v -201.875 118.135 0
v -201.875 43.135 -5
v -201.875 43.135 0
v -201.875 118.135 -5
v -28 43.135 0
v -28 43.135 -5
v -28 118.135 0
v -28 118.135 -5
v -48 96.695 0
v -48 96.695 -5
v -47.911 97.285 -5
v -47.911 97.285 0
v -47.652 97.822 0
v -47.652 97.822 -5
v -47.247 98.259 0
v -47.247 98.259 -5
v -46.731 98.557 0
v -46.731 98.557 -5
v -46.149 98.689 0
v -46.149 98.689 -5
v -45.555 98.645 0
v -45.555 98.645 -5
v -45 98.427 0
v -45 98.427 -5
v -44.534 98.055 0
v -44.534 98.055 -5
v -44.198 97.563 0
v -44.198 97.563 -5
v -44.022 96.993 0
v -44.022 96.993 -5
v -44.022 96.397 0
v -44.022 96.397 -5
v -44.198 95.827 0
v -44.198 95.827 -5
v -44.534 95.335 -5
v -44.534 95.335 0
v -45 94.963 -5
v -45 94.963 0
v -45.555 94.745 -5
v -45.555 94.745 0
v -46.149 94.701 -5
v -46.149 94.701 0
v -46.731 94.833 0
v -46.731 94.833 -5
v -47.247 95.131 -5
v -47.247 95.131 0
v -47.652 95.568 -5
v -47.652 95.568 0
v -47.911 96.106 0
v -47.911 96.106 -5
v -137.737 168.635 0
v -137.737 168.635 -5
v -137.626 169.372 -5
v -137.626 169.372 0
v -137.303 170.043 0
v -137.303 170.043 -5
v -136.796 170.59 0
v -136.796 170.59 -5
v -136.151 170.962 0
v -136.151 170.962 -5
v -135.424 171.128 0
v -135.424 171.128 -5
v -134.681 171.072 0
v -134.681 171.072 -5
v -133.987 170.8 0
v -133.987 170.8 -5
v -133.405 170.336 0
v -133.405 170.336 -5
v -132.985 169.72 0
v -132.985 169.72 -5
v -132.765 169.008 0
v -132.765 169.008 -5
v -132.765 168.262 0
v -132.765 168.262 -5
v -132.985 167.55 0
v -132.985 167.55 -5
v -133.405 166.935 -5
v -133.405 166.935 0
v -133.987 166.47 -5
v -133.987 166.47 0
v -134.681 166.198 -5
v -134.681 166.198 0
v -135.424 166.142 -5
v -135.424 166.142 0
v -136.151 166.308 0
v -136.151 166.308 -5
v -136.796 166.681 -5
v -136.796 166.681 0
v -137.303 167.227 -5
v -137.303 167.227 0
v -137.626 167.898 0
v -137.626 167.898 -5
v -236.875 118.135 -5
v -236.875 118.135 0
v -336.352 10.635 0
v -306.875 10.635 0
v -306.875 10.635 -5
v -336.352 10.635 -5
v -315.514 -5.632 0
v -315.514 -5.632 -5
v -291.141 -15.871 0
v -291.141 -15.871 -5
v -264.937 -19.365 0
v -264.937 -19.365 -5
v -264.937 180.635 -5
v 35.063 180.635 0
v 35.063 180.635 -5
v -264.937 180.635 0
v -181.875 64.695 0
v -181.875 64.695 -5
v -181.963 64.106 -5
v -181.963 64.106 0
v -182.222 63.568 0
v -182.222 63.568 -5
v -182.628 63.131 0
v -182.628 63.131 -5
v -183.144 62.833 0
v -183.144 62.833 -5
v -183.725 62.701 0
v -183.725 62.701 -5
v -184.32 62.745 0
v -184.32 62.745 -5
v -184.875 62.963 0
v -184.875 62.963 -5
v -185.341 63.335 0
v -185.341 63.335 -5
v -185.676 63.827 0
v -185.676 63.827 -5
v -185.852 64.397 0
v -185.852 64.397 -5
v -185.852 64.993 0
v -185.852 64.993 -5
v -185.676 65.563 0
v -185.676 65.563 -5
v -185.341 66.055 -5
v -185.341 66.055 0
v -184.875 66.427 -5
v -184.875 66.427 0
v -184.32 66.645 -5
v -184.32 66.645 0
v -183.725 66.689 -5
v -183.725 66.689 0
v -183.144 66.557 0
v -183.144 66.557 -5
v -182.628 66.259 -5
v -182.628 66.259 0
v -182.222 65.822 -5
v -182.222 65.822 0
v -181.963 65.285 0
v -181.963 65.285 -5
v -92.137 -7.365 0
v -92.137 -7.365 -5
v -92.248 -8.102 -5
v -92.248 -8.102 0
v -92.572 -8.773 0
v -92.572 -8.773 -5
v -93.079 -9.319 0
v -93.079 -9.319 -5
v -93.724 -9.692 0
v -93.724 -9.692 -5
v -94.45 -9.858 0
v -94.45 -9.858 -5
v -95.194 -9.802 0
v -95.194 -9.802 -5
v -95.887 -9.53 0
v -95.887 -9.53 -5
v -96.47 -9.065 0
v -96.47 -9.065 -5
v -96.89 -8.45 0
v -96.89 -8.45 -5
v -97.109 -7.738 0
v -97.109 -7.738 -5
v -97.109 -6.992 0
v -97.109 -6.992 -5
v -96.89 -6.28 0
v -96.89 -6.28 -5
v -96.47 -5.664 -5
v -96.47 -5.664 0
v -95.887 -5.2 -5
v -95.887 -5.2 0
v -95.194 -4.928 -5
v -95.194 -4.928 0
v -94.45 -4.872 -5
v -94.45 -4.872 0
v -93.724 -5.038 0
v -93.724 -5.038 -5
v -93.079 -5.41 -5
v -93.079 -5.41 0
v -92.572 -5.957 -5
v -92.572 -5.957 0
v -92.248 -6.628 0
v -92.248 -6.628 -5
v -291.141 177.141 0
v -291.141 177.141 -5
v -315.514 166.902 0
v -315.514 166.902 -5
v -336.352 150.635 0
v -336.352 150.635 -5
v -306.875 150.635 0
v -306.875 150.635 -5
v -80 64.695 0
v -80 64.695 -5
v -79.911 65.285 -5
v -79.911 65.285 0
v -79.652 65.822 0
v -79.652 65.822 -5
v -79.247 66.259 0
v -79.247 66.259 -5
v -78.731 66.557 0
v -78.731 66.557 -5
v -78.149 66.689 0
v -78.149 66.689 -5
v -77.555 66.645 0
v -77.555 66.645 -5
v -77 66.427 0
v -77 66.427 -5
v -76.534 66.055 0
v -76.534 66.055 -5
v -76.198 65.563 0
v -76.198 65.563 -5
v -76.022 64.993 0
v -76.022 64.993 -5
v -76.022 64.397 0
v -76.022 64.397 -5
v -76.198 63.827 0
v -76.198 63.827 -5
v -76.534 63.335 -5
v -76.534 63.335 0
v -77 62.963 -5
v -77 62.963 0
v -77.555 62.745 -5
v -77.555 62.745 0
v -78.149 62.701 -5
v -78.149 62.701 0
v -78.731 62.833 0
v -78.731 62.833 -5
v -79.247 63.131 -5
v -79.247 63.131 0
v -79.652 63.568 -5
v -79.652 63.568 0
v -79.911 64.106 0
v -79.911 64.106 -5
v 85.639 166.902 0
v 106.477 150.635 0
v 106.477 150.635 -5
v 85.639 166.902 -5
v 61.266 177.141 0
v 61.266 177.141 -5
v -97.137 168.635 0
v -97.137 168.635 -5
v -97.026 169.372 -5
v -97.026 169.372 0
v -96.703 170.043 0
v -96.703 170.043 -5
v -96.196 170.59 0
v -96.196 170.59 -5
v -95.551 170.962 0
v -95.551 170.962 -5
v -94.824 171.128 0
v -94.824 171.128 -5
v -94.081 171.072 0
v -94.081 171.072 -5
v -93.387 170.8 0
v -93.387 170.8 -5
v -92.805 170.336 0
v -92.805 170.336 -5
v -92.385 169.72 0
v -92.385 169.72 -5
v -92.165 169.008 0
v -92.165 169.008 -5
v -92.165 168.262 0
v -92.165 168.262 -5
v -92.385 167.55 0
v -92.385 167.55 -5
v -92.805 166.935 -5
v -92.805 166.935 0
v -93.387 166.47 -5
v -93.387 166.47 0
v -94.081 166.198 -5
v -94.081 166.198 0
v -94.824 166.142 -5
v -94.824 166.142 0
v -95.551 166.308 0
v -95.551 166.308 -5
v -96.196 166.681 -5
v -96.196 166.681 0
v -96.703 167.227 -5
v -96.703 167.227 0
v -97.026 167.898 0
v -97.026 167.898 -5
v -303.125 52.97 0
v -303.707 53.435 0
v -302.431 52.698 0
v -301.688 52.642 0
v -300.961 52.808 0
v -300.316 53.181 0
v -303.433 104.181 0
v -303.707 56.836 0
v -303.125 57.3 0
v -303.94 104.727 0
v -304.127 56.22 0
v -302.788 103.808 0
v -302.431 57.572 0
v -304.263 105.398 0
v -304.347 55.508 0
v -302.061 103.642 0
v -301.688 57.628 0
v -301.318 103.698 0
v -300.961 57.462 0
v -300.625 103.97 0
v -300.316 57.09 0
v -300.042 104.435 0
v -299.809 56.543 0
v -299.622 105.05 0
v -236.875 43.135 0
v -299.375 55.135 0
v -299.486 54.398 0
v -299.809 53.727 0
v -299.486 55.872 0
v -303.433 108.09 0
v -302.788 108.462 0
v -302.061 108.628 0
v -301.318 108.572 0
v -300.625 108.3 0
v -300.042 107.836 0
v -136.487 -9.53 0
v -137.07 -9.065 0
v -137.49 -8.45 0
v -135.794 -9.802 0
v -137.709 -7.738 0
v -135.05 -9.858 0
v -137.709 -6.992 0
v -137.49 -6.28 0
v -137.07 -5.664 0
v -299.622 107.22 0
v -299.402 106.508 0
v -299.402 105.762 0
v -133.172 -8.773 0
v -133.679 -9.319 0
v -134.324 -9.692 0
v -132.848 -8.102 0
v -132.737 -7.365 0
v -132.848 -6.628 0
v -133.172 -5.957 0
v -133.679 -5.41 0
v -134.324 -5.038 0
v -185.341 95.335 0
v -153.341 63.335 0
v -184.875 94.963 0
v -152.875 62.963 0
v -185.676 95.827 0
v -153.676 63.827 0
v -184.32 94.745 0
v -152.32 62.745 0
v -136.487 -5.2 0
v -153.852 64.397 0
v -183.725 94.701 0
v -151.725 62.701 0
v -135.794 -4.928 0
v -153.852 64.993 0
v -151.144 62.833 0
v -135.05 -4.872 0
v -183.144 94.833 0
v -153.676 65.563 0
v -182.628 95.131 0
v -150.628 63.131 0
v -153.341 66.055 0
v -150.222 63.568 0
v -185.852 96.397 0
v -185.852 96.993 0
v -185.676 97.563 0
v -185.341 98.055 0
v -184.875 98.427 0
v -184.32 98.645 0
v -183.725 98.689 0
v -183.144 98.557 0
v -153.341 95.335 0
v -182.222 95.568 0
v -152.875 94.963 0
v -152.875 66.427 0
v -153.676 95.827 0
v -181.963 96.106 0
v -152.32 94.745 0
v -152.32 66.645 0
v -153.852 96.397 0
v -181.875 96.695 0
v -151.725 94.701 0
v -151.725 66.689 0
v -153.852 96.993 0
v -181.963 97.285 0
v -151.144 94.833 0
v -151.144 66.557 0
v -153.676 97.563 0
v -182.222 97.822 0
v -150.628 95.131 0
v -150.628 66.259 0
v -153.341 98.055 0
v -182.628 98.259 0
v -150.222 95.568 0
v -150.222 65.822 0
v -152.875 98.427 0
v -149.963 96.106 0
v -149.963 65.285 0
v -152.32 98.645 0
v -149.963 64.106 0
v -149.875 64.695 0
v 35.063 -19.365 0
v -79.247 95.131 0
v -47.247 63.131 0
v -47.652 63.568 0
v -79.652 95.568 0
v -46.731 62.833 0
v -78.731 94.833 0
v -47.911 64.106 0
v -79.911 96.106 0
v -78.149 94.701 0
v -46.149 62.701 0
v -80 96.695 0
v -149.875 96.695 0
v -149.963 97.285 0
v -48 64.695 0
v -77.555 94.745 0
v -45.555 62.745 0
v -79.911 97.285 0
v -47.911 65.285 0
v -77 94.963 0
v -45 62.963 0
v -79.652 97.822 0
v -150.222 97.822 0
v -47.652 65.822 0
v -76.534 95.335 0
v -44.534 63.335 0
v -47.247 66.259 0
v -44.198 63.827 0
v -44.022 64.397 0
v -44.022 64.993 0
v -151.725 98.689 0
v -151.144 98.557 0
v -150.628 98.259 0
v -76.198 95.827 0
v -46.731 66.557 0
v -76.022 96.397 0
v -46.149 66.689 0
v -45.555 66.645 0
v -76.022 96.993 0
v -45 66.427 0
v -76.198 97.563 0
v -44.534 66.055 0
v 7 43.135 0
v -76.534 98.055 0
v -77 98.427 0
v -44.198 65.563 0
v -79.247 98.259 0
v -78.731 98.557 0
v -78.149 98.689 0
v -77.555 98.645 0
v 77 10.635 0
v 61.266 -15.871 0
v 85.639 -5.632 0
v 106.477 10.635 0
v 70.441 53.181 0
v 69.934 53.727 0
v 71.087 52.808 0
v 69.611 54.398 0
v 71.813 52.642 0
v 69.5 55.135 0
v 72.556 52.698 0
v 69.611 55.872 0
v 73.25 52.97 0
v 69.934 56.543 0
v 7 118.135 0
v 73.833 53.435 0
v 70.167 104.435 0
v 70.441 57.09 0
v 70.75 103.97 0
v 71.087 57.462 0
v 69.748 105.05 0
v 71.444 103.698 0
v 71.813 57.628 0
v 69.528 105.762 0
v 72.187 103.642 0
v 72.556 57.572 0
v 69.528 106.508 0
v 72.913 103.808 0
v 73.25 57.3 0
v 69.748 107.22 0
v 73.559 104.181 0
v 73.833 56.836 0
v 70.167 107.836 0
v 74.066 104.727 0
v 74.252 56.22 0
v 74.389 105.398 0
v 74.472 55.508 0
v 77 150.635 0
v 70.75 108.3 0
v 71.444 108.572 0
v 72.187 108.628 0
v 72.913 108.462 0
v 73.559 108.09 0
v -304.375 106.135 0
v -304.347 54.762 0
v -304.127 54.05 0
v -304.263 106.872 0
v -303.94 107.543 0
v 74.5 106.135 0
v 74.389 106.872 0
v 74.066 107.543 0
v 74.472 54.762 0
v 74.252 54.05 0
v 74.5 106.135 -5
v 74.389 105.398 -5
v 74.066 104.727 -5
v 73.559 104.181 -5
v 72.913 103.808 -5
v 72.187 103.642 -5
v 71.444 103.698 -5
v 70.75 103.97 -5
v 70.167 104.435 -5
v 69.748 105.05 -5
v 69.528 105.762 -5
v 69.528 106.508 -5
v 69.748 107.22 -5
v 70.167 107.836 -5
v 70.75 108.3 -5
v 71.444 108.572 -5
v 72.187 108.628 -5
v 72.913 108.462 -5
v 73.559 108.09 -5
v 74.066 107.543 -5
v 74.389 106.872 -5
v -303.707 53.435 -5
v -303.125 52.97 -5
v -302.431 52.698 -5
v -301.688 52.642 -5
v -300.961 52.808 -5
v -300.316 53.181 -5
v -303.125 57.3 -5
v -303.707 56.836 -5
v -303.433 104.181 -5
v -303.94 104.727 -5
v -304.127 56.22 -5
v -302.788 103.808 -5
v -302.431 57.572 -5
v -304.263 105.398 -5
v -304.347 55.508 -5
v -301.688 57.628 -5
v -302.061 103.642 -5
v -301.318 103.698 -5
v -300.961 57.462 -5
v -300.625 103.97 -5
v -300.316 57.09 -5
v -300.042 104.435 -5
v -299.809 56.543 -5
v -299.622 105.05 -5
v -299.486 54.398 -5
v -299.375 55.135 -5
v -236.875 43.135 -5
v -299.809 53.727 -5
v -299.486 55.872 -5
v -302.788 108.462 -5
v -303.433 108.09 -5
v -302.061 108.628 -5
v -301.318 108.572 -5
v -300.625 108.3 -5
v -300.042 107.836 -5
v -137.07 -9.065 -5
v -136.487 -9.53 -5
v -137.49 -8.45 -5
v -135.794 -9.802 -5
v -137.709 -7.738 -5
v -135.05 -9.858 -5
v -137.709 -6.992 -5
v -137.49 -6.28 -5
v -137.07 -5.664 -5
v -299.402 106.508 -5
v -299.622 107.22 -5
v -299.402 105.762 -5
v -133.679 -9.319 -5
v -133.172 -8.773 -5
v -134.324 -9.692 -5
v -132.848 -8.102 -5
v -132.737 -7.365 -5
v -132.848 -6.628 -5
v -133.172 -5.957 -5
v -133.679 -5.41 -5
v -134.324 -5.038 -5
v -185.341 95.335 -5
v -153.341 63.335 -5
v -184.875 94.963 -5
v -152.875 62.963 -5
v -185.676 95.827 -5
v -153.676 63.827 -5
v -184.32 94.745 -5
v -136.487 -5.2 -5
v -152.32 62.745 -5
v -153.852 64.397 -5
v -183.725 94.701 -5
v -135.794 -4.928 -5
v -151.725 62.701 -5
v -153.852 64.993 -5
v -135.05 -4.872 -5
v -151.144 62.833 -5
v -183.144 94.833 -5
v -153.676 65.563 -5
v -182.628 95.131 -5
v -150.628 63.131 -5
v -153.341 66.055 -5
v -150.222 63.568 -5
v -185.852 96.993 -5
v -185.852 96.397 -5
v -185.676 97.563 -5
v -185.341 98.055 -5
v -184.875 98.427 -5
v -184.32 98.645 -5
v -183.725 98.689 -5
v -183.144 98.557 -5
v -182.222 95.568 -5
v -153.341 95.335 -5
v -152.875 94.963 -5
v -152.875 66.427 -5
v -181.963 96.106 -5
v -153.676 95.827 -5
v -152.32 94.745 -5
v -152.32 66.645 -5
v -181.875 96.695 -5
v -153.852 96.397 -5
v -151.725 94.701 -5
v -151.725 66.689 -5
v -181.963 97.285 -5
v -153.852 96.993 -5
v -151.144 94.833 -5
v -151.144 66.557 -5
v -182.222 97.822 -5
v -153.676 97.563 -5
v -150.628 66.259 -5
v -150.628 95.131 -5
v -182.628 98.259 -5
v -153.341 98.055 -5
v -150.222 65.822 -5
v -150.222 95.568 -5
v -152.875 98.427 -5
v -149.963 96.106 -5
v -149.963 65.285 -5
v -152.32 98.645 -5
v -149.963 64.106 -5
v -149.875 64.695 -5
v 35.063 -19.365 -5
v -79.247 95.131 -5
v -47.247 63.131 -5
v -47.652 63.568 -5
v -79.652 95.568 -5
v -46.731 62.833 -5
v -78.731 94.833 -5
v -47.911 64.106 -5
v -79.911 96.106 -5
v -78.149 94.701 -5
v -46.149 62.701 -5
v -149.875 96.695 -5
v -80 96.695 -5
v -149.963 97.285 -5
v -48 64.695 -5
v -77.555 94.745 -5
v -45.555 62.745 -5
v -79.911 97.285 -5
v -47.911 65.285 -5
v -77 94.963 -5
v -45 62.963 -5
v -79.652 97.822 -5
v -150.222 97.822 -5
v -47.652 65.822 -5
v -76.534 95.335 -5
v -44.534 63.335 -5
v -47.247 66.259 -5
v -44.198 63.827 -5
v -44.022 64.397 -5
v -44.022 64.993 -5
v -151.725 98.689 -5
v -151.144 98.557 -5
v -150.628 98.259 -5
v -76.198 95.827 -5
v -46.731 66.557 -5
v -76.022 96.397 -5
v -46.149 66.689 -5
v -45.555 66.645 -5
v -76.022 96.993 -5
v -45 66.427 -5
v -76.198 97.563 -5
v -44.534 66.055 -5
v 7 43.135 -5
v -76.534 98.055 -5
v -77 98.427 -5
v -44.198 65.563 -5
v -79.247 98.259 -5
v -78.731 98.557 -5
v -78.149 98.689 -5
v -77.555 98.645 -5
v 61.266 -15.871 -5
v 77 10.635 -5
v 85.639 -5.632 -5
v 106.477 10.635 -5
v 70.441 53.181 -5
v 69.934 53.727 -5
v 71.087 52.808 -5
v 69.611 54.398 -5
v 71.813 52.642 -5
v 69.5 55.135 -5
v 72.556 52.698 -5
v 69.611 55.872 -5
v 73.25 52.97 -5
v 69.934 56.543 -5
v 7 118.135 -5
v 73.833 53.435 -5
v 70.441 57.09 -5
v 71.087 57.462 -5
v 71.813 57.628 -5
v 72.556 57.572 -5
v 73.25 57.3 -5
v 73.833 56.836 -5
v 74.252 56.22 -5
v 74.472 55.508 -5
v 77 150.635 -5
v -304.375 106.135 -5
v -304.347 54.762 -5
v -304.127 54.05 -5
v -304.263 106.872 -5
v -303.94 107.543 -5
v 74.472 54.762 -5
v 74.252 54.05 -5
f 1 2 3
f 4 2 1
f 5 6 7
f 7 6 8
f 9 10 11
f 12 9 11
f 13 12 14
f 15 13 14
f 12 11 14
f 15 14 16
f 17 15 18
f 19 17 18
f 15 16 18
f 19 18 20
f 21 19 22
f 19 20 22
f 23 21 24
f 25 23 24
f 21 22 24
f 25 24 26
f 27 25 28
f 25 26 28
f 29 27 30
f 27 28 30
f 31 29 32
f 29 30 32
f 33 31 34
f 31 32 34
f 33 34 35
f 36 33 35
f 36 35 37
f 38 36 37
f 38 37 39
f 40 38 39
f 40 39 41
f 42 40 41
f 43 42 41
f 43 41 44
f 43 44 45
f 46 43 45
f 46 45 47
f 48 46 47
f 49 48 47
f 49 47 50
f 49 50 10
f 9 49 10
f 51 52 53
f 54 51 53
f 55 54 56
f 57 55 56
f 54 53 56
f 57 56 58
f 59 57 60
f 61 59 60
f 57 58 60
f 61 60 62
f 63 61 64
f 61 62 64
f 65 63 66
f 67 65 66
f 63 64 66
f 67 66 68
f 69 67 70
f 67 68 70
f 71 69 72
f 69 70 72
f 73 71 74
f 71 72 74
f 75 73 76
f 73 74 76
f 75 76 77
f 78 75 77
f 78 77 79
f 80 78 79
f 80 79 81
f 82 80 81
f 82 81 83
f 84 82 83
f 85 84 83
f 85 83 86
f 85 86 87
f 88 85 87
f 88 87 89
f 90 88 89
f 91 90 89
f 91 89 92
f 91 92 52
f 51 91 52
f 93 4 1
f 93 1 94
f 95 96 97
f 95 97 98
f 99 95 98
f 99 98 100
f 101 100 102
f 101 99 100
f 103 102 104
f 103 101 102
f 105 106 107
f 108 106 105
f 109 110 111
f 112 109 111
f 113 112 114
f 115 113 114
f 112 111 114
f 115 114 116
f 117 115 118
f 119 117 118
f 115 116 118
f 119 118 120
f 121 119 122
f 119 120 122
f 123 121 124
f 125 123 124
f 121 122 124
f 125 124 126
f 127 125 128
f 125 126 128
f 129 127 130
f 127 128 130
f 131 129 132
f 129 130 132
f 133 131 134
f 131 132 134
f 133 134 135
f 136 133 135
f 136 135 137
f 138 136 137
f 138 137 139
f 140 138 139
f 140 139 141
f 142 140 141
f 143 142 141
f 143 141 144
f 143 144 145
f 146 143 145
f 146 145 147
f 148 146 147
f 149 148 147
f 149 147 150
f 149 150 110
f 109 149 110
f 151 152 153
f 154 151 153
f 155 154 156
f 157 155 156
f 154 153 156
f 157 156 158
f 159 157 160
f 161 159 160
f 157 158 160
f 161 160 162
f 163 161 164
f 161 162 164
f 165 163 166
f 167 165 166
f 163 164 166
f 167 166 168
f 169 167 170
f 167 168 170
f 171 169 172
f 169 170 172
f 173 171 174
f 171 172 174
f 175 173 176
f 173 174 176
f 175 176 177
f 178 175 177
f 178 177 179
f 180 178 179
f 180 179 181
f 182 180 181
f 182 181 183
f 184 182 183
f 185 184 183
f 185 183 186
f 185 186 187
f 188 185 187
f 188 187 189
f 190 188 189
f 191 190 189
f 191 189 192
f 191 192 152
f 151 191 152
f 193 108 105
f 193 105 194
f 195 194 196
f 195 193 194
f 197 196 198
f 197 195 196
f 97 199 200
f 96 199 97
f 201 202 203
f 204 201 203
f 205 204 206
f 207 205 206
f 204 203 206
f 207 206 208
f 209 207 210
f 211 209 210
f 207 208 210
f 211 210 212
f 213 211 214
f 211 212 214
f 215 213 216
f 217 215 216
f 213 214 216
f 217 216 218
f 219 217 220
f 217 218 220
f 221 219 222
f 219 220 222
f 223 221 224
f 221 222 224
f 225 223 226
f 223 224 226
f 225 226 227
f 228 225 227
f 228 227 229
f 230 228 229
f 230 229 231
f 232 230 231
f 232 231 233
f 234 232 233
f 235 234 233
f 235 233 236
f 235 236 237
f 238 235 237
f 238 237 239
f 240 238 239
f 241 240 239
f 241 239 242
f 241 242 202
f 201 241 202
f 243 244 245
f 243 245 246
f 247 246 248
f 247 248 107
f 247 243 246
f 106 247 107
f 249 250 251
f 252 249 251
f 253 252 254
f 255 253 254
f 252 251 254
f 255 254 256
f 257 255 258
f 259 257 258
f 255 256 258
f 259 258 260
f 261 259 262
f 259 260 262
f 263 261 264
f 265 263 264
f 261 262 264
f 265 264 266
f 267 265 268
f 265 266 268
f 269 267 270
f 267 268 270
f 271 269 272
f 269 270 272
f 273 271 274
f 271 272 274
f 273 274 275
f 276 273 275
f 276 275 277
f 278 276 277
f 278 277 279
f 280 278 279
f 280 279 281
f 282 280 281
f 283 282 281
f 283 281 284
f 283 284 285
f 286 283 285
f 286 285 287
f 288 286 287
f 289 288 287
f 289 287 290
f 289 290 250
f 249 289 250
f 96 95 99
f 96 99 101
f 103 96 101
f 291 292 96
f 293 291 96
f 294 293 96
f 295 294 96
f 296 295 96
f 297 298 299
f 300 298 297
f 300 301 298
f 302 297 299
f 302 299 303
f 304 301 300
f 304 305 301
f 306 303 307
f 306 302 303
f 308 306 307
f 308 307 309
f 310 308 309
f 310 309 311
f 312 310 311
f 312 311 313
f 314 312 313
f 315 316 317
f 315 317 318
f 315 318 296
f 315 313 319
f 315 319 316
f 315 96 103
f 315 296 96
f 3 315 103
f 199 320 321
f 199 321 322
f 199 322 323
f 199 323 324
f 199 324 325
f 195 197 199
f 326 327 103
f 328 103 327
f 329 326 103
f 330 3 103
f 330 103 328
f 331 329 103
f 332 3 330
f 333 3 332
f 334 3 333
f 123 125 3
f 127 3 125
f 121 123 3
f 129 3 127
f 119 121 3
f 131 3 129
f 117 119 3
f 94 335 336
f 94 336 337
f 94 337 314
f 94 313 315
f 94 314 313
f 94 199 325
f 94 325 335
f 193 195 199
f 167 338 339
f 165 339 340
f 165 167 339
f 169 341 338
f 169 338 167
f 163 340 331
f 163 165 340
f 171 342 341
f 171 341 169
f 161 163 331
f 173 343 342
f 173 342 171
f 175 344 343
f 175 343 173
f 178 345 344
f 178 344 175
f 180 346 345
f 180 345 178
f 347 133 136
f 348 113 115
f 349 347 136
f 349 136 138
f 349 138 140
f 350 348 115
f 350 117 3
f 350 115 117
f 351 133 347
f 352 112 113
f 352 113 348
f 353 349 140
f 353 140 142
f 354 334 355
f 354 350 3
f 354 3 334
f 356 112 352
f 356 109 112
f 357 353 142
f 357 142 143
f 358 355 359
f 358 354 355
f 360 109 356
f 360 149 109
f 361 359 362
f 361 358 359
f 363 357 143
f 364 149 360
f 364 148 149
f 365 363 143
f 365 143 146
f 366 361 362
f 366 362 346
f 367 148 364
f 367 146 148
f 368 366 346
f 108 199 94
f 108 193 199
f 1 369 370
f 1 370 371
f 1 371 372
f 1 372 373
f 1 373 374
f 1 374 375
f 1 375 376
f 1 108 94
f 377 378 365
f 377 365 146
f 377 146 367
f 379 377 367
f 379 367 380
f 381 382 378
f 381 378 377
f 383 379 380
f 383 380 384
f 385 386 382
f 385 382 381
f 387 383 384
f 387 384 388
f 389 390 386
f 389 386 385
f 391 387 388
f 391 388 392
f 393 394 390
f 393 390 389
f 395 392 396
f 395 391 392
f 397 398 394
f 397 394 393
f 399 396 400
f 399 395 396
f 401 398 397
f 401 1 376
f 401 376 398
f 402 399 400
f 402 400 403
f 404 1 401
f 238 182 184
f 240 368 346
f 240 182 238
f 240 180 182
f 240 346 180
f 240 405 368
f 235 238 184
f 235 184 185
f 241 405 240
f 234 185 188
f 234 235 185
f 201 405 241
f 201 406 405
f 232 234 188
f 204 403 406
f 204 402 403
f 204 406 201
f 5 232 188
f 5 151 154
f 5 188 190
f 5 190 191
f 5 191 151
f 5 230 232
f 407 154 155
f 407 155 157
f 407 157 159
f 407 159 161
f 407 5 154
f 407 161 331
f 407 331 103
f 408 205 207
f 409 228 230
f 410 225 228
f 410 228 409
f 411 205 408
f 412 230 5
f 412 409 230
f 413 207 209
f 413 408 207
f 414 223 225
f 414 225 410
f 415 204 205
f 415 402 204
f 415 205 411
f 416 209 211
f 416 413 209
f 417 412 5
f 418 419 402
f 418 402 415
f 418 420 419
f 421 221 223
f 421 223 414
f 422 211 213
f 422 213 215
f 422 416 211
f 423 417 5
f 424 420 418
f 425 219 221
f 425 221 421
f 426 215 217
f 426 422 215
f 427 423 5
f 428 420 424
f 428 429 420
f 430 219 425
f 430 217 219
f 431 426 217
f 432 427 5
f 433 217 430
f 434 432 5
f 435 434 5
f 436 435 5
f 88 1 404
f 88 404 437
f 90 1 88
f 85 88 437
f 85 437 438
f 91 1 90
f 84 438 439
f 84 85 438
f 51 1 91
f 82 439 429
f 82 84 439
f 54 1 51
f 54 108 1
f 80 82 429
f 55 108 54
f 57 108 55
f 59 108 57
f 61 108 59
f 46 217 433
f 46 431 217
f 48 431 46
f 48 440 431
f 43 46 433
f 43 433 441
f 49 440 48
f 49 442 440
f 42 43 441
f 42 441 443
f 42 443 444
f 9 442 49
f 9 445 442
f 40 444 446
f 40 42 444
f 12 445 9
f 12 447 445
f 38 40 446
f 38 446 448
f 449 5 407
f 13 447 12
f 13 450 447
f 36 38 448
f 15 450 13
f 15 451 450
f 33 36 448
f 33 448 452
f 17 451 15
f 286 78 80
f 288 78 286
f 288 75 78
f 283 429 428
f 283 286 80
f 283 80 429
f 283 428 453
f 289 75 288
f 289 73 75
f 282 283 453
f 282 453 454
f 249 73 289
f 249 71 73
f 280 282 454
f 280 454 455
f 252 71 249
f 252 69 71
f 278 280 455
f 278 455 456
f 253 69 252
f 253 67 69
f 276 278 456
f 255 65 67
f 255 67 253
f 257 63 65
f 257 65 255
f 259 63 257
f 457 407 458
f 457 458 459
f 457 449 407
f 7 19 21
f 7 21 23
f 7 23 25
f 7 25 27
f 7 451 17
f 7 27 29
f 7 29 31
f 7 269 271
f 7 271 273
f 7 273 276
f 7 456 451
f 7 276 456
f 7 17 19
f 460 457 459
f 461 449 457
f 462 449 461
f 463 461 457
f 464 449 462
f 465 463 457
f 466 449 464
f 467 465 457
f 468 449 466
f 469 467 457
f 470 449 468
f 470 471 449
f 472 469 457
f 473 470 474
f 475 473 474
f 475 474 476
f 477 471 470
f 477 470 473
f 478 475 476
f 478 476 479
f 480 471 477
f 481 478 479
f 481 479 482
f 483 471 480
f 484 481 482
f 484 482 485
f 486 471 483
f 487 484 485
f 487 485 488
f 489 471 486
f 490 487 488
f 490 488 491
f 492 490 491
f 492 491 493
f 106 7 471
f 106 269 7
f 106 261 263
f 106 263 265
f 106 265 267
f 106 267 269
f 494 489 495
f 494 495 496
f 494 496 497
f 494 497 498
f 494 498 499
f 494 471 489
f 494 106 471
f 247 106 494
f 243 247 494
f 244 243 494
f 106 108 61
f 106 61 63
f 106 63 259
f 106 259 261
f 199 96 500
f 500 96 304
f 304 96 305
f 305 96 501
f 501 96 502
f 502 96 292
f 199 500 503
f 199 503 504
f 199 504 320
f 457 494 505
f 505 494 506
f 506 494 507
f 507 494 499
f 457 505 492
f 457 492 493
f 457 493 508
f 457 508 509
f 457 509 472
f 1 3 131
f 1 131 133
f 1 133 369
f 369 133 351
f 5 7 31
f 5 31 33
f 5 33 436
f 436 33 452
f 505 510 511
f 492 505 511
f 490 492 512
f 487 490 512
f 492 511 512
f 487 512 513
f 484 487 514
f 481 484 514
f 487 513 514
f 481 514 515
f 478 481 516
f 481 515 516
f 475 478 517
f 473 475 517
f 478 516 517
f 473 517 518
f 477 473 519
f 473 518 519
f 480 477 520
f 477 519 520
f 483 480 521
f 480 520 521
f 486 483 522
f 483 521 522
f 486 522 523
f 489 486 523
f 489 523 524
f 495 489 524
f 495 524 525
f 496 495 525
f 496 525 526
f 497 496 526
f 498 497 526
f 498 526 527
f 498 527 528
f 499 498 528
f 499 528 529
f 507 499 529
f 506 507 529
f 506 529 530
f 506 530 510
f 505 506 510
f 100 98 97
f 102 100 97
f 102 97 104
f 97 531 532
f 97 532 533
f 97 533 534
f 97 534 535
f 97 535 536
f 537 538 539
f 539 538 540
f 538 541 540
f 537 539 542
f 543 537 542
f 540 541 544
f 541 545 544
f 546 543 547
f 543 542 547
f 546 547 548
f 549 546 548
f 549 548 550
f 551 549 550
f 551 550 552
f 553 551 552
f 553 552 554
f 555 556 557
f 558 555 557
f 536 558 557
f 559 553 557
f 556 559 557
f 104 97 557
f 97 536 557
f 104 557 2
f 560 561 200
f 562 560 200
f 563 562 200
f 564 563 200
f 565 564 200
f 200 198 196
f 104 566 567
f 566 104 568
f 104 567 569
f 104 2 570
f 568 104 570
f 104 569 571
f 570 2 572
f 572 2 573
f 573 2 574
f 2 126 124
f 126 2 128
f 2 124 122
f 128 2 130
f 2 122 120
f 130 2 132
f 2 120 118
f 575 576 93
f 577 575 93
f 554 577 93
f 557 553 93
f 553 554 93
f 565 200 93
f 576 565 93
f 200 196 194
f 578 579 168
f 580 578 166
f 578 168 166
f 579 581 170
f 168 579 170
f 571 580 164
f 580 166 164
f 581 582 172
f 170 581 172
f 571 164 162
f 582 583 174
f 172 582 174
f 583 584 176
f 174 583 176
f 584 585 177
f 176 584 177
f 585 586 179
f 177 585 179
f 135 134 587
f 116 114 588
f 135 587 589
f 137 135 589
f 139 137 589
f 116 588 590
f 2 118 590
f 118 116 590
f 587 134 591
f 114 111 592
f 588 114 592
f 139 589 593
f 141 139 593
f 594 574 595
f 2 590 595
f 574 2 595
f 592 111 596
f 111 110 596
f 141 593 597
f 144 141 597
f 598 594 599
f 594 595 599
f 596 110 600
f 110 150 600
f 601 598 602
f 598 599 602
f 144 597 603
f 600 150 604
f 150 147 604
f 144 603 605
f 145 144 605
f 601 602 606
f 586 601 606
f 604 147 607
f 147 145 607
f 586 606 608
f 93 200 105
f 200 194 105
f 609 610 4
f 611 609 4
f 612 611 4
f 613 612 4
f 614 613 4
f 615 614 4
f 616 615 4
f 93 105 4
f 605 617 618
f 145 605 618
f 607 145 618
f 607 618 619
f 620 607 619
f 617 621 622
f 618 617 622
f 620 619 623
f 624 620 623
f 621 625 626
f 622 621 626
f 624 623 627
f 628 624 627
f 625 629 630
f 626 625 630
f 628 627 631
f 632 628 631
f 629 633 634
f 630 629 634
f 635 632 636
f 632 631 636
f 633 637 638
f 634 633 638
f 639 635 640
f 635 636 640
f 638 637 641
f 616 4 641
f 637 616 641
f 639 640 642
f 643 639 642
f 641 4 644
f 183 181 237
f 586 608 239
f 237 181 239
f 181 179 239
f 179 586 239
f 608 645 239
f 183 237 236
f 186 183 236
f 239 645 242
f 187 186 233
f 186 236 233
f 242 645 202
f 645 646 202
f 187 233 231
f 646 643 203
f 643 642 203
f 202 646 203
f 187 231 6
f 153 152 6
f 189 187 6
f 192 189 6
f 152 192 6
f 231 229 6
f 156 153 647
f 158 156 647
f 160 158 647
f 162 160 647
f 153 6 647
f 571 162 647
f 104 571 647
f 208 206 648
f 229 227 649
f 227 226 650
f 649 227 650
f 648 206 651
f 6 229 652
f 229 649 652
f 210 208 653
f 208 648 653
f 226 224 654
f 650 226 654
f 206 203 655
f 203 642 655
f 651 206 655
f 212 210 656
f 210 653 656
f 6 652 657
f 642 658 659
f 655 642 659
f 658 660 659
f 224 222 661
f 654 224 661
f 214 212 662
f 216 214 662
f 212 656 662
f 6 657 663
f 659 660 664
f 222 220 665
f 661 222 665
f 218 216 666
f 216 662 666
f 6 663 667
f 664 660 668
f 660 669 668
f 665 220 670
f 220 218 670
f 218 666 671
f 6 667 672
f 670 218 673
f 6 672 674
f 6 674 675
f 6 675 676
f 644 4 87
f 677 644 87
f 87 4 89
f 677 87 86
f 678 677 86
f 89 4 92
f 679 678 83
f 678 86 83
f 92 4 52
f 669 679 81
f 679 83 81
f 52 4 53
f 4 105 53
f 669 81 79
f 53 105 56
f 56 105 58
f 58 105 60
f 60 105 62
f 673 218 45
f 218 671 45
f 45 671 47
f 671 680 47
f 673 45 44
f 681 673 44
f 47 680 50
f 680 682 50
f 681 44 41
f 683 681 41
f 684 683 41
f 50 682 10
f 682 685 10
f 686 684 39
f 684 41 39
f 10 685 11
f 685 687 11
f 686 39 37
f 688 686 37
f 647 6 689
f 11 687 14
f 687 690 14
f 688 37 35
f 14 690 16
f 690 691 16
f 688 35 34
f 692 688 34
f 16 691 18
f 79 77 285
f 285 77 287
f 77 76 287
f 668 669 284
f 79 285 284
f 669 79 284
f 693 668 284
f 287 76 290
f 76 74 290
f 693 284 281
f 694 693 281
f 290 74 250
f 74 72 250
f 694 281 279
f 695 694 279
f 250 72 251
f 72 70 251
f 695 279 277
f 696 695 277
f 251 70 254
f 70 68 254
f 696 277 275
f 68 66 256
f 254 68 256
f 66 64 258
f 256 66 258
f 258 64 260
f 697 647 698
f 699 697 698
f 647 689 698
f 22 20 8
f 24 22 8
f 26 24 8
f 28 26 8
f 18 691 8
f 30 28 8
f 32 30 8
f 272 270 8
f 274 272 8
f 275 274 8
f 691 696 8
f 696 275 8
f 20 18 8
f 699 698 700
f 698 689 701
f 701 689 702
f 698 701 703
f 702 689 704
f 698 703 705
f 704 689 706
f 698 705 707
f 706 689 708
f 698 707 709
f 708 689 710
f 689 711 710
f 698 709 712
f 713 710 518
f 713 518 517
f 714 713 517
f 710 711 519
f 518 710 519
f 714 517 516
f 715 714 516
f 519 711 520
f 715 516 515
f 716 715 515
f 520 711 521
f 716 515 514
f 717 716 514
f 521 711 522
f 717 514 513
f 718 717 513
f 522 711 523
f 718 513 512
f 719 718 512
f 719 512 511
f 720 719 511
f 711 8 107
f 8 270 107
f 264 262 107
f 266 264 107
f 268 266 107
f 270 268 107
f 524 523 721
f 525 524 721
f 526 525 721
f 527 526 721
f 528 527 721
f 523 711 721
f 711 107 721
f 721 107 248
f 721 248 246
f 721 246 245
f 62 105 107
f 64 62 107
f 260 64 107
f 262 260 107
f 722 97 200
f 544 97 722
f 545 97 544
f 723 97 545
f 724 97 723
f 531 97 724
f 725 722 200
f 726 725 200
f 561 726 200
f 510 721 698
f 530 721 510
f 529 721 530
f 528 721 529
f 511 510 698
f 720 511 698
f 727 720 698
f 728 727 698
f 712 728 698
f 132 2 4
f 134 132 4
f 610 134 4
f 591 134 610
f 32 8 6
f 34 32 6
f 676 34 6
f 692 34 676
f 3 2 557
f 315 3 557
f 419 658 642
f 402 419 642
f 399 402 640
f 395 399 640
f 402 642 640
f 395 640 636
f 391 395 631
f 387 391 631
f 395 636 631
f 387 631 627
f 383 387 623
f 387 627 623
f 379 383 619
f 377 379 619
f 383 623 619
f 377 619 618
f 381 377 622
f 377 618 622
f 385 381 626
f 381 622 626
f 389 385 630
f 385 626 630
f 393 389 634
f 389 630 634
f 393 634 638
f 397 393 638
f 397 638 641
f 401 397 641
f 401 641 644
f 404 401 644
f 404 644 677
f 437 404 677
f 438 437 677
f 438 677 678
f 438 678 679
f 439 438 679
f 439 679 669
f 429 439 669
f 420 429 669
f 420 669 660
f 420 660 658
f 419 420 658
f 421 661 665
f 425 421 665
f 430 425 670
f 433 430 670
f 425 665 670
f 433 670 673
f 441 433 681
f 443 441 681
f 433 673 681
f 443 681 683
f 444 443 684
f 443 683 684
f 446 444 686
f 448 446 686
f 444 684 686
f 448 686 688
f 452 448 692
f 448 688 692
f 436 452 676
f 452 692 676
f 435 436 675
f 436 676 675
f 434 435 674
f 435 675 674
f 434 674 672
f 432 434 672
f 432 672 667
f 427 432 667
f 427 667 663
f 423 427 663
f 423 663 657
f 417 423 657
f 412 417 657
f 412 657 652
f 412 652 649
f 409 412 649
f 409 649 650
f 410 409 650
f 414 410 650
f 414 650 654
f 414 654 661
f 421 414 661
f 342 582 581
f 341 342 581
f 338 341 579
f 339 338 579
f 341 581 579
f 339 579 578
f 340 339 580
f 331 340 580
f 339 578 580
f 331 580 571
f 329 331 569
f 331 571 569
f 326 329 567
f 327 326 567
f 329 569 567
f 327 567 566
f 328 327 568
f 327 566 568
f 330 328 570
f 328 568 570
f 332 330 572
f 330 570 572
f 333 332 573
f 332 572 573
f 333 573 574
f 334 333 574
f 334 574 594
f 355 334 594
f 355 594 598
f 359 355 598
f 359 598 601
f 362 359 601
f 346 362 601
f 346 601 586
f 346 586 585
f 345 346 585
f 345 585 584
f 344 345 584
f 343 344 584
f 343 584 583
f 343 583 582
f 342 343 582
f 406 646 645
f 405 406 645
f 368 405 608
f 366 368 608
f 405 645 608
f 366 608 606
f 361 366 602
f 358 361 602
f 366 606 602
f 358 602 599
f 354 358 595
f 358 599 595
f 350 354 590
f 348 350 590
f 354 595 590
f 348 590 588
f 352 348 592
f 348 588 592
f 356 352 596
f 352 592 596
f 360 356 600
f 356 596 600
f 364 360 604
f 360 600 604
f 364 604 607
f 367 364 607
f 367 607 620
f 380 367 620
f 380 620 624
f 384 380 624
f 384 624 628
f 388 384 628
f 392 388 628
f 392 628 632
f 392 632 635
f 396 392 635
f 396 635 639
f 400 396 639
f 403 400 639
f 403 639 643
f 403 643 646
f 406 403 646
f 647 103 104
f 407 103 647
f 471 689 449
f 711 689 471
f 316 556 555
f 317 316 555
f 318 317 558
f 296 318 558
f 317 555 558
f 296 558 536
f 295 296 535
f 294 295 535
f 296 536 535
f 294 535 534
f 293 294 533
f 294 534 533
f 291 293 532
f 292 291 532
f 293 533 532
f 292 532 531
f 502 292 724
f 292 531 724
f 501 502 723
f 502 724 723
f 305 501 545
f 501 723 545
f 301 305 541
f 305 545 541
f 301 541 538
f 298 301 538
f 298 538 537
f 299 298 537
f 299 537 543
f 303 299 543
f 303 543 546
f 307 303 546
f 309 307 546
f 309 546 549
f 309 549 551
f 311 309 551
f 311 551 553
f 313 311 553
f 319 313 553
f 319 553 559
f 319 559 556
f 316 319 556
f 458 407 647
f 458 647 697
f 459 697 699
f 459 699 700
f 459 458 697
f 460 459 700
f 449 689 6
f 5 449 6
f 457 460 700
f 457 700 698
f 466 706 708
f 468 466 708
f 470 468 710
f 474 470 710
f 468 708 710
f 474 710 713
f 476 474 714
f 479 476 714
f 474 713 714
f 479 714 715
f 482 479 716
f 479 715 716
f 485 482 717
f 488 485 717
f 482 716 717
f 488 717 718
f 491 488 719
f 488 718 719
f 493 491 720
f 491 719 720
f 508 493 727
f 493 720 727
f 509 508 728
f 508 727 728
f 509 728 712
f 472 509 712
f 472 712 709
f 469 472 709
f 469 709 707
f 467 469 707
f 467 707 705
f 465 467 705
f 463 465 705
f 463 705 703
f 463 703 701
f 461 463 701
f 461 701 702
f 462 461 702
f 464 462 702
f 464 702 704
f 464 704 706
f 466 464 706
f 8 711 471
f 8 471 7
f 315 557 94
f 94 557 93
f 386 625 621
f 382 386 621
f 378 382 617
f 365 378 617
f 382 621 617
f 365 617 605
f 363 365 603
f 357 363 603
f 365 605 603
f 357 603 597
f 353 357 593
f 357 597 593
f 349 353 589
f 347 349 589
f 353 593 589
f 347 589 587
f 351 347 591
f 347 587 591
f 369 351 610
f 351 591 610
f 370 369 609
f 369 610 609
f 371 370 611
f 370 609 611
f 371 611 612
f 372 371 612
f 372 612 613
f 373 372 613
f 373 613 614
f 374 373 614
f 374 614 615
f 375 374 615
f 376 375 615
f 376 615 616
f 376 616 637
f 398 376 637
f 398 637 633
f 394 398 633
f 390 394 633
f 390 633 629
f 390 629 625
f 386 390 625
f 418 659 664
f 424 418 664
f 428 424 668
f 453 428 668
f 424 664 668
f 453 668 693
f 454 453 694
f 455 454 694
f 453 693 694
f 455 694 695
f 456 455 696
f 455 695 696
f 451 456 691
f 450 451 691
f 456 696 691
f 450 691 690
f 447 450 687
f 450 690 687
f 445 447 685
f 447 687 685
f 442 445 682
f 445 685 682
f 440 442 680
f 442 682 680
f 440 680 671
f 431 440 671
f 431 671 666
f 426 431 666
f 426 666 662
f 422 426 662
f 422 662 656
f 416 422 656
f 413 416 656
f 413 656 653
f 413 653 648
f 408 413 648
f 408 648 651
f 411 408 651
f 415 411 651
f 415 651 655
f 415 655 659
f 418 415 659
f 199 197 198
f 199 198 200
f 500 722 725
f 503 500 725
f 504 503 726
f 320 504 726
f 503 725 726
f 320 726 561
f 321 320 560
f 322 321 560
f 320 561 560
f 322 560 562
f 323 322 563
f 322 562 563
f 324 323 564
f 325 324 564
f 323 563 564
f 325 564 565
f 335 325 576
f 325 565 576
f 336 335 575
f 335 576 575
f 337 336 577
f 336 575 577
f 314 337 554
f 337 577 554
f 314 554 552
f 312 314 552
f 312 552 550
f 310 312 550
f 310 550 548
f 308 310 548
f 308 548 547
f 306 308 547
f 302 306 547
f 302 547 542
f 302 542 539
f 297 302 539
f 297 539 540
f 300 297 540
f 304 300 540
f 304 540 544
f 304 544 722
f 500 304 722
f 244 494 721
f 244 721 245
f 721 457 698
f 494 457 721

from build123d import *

# Parameters (mm, degrees)
BOSS_EXTRUDE1_DEPTH = 5
SKETCH2_R           = 2.5
SKETCH2_W           = 35
SKETCH2_H           = 75
CUT_EXTRUDE1_DEPTH  = 10
SKETCH4_R           = 2
CUT_EXTRUDE3_DEPTH  = 10
SKETCH5_R           = 2.5
CUT_EXTRUDE4_DEPTH  = 10


with BuildPart() as part:
    # Sketch1 → Boss-Extrude1 (new body)
    with BuildSketch(Plane.XY):
        with BuildLine():
            Line((77, 150.635083269), (106.477021815, 150.635083269))
            ThreePointArc((106.477021815, 150.635083269), (73.792570992, 172.830527842), (35.06273753, 180.635083269))
            Line((35.06273753, 180.635083269), (-264.93726247, 180.635083269))
            ThreePointArc((-264.93726247, 180.635083269), (-303.667095932, 172.830527842), (-336.351546756, 150.635083269))
            Line((-336.351546756, 150.635083269), (-306.874524941, 150.635083269))
            Line((-306.874524941, 150.635083269), (-306.874524941, 10.635083269))
            Line((-306.874524941, 10.635083269), (-336.351546756, 10.635083269))
            ThreePointArc((-336.351546756, 10.635083269), (-303.667095932, -11.560361304), (-264.93726247, -19.364916731))
            Line((-264.93726247, -19.364916731), (35.06273753, -19.364916731))
            ThreePointArc((35.06273753, -19.364916731), (73.792570992, -11.560361304), (106.477021815, 10.635083269))
            Line((106.477021815, 10.635083269), (77, 10.635083269))
            Line((77, 10.635083269), (77, 150.635083269))
        make_face()
    extrude(amount=-BOSS_EXTRUDE1_DEPTH)

    # Sketch2 → Cut-Extrude1 (cut)
    with BuildSketch(Plane(origin=(0, 0, -5), x_dir=(-1, 0, 0), z_dir=(0, 0, -1))):
        with Locations((301.874524941, 106.135083269)):
            Circle(SKETCH2_R)
        with Locations(Location((301.874524941, 55.135083269, 0), (0, 0, 180))):
            Circle(SKETCH2_R)
        with Locations((-72, 55.135083269)):
            Circle(SKETCH2_R)
        with Locations(Location((-72, 106.135083269, 0), (0, 0, 180))):
            Circle(SKETCH2_R)
        with Locations((219.374524941, 80.635083269)):
            Rectangle(SKETCH2_W, SKETCH2_H)
        with Locations((10.5, 80.635083269)):
            Rectangle(SKETCH2_W, SKETCH2_H)
    extrude(amount=-CUT_EXTRUDE1_DEPTH, mode=Mode.SUBTRACT)

    # Sketch4 → Cut-Extrude3 (cut)
    with BuildSketch(Plane(origin=(0, 0, -5), x_dir=(-1, 0, 0), z_dir=(0, 0, -1))):
        with Locations((46, 64.695083269)):
            Circle(SKETCH4_R)
        with Locations((46, 96.695083269)):
            Circle(SKETCH4_R)
        with Locations((78, 64.695083269)):
            Circle(SKETCH4_R)
        with Locations((78, 96.695083269)):
            Circle(SKETCH4_R)
        with Locations(Location((151.874524941, 64.695083269, 0), (0, 0, 180))):
            Circle(SKETCH4_R)
        with Locations(Location((183.874524941, 64.695083269, 0), (0, 0, 180))):
            Circle(SKETCH4_R)
        with Locations(Location((183.874524941, 96.695083269, 0), (0, 0, 180))):
            Circle(SKETCH4_R)
        with Locations(Location((151.874524941, 96.695083269, 0), (0, 0, 180))):
            Circle(SKETCH4_R)
    extrude(amount=-CUT_EXTRUDE3_DEPTH, mode=Mode.SUBTRACT)

    # Sketch5 → Cut-Extrude4 (cut)
    with BuildSketch(Plane(origin=(0, 0, -5), x_dir=(-1, 0, 0), z_dir=(0, 0, -1))):
        with Locations((94.63726247, 168.635083269)):
            Circle(SKETCH5_R)
        with Locations((135.23726247, 168.635083269)):
            Circle(SKETCH5_R)
        with Locations(Location((94.63726247, -7.364916731, 0), (0, 0, 180))):
            Circle(SKETCH5_R)
        with Locations(Location((135.23726247, -7.364916731, 0), (0, 0, 180))):
            Circle(SKETCH5_R)
    extrude(amount=-CUT_EXTRUDE4_DEPTH, mode=Mode.SUBTRACT)


solid = part.part
